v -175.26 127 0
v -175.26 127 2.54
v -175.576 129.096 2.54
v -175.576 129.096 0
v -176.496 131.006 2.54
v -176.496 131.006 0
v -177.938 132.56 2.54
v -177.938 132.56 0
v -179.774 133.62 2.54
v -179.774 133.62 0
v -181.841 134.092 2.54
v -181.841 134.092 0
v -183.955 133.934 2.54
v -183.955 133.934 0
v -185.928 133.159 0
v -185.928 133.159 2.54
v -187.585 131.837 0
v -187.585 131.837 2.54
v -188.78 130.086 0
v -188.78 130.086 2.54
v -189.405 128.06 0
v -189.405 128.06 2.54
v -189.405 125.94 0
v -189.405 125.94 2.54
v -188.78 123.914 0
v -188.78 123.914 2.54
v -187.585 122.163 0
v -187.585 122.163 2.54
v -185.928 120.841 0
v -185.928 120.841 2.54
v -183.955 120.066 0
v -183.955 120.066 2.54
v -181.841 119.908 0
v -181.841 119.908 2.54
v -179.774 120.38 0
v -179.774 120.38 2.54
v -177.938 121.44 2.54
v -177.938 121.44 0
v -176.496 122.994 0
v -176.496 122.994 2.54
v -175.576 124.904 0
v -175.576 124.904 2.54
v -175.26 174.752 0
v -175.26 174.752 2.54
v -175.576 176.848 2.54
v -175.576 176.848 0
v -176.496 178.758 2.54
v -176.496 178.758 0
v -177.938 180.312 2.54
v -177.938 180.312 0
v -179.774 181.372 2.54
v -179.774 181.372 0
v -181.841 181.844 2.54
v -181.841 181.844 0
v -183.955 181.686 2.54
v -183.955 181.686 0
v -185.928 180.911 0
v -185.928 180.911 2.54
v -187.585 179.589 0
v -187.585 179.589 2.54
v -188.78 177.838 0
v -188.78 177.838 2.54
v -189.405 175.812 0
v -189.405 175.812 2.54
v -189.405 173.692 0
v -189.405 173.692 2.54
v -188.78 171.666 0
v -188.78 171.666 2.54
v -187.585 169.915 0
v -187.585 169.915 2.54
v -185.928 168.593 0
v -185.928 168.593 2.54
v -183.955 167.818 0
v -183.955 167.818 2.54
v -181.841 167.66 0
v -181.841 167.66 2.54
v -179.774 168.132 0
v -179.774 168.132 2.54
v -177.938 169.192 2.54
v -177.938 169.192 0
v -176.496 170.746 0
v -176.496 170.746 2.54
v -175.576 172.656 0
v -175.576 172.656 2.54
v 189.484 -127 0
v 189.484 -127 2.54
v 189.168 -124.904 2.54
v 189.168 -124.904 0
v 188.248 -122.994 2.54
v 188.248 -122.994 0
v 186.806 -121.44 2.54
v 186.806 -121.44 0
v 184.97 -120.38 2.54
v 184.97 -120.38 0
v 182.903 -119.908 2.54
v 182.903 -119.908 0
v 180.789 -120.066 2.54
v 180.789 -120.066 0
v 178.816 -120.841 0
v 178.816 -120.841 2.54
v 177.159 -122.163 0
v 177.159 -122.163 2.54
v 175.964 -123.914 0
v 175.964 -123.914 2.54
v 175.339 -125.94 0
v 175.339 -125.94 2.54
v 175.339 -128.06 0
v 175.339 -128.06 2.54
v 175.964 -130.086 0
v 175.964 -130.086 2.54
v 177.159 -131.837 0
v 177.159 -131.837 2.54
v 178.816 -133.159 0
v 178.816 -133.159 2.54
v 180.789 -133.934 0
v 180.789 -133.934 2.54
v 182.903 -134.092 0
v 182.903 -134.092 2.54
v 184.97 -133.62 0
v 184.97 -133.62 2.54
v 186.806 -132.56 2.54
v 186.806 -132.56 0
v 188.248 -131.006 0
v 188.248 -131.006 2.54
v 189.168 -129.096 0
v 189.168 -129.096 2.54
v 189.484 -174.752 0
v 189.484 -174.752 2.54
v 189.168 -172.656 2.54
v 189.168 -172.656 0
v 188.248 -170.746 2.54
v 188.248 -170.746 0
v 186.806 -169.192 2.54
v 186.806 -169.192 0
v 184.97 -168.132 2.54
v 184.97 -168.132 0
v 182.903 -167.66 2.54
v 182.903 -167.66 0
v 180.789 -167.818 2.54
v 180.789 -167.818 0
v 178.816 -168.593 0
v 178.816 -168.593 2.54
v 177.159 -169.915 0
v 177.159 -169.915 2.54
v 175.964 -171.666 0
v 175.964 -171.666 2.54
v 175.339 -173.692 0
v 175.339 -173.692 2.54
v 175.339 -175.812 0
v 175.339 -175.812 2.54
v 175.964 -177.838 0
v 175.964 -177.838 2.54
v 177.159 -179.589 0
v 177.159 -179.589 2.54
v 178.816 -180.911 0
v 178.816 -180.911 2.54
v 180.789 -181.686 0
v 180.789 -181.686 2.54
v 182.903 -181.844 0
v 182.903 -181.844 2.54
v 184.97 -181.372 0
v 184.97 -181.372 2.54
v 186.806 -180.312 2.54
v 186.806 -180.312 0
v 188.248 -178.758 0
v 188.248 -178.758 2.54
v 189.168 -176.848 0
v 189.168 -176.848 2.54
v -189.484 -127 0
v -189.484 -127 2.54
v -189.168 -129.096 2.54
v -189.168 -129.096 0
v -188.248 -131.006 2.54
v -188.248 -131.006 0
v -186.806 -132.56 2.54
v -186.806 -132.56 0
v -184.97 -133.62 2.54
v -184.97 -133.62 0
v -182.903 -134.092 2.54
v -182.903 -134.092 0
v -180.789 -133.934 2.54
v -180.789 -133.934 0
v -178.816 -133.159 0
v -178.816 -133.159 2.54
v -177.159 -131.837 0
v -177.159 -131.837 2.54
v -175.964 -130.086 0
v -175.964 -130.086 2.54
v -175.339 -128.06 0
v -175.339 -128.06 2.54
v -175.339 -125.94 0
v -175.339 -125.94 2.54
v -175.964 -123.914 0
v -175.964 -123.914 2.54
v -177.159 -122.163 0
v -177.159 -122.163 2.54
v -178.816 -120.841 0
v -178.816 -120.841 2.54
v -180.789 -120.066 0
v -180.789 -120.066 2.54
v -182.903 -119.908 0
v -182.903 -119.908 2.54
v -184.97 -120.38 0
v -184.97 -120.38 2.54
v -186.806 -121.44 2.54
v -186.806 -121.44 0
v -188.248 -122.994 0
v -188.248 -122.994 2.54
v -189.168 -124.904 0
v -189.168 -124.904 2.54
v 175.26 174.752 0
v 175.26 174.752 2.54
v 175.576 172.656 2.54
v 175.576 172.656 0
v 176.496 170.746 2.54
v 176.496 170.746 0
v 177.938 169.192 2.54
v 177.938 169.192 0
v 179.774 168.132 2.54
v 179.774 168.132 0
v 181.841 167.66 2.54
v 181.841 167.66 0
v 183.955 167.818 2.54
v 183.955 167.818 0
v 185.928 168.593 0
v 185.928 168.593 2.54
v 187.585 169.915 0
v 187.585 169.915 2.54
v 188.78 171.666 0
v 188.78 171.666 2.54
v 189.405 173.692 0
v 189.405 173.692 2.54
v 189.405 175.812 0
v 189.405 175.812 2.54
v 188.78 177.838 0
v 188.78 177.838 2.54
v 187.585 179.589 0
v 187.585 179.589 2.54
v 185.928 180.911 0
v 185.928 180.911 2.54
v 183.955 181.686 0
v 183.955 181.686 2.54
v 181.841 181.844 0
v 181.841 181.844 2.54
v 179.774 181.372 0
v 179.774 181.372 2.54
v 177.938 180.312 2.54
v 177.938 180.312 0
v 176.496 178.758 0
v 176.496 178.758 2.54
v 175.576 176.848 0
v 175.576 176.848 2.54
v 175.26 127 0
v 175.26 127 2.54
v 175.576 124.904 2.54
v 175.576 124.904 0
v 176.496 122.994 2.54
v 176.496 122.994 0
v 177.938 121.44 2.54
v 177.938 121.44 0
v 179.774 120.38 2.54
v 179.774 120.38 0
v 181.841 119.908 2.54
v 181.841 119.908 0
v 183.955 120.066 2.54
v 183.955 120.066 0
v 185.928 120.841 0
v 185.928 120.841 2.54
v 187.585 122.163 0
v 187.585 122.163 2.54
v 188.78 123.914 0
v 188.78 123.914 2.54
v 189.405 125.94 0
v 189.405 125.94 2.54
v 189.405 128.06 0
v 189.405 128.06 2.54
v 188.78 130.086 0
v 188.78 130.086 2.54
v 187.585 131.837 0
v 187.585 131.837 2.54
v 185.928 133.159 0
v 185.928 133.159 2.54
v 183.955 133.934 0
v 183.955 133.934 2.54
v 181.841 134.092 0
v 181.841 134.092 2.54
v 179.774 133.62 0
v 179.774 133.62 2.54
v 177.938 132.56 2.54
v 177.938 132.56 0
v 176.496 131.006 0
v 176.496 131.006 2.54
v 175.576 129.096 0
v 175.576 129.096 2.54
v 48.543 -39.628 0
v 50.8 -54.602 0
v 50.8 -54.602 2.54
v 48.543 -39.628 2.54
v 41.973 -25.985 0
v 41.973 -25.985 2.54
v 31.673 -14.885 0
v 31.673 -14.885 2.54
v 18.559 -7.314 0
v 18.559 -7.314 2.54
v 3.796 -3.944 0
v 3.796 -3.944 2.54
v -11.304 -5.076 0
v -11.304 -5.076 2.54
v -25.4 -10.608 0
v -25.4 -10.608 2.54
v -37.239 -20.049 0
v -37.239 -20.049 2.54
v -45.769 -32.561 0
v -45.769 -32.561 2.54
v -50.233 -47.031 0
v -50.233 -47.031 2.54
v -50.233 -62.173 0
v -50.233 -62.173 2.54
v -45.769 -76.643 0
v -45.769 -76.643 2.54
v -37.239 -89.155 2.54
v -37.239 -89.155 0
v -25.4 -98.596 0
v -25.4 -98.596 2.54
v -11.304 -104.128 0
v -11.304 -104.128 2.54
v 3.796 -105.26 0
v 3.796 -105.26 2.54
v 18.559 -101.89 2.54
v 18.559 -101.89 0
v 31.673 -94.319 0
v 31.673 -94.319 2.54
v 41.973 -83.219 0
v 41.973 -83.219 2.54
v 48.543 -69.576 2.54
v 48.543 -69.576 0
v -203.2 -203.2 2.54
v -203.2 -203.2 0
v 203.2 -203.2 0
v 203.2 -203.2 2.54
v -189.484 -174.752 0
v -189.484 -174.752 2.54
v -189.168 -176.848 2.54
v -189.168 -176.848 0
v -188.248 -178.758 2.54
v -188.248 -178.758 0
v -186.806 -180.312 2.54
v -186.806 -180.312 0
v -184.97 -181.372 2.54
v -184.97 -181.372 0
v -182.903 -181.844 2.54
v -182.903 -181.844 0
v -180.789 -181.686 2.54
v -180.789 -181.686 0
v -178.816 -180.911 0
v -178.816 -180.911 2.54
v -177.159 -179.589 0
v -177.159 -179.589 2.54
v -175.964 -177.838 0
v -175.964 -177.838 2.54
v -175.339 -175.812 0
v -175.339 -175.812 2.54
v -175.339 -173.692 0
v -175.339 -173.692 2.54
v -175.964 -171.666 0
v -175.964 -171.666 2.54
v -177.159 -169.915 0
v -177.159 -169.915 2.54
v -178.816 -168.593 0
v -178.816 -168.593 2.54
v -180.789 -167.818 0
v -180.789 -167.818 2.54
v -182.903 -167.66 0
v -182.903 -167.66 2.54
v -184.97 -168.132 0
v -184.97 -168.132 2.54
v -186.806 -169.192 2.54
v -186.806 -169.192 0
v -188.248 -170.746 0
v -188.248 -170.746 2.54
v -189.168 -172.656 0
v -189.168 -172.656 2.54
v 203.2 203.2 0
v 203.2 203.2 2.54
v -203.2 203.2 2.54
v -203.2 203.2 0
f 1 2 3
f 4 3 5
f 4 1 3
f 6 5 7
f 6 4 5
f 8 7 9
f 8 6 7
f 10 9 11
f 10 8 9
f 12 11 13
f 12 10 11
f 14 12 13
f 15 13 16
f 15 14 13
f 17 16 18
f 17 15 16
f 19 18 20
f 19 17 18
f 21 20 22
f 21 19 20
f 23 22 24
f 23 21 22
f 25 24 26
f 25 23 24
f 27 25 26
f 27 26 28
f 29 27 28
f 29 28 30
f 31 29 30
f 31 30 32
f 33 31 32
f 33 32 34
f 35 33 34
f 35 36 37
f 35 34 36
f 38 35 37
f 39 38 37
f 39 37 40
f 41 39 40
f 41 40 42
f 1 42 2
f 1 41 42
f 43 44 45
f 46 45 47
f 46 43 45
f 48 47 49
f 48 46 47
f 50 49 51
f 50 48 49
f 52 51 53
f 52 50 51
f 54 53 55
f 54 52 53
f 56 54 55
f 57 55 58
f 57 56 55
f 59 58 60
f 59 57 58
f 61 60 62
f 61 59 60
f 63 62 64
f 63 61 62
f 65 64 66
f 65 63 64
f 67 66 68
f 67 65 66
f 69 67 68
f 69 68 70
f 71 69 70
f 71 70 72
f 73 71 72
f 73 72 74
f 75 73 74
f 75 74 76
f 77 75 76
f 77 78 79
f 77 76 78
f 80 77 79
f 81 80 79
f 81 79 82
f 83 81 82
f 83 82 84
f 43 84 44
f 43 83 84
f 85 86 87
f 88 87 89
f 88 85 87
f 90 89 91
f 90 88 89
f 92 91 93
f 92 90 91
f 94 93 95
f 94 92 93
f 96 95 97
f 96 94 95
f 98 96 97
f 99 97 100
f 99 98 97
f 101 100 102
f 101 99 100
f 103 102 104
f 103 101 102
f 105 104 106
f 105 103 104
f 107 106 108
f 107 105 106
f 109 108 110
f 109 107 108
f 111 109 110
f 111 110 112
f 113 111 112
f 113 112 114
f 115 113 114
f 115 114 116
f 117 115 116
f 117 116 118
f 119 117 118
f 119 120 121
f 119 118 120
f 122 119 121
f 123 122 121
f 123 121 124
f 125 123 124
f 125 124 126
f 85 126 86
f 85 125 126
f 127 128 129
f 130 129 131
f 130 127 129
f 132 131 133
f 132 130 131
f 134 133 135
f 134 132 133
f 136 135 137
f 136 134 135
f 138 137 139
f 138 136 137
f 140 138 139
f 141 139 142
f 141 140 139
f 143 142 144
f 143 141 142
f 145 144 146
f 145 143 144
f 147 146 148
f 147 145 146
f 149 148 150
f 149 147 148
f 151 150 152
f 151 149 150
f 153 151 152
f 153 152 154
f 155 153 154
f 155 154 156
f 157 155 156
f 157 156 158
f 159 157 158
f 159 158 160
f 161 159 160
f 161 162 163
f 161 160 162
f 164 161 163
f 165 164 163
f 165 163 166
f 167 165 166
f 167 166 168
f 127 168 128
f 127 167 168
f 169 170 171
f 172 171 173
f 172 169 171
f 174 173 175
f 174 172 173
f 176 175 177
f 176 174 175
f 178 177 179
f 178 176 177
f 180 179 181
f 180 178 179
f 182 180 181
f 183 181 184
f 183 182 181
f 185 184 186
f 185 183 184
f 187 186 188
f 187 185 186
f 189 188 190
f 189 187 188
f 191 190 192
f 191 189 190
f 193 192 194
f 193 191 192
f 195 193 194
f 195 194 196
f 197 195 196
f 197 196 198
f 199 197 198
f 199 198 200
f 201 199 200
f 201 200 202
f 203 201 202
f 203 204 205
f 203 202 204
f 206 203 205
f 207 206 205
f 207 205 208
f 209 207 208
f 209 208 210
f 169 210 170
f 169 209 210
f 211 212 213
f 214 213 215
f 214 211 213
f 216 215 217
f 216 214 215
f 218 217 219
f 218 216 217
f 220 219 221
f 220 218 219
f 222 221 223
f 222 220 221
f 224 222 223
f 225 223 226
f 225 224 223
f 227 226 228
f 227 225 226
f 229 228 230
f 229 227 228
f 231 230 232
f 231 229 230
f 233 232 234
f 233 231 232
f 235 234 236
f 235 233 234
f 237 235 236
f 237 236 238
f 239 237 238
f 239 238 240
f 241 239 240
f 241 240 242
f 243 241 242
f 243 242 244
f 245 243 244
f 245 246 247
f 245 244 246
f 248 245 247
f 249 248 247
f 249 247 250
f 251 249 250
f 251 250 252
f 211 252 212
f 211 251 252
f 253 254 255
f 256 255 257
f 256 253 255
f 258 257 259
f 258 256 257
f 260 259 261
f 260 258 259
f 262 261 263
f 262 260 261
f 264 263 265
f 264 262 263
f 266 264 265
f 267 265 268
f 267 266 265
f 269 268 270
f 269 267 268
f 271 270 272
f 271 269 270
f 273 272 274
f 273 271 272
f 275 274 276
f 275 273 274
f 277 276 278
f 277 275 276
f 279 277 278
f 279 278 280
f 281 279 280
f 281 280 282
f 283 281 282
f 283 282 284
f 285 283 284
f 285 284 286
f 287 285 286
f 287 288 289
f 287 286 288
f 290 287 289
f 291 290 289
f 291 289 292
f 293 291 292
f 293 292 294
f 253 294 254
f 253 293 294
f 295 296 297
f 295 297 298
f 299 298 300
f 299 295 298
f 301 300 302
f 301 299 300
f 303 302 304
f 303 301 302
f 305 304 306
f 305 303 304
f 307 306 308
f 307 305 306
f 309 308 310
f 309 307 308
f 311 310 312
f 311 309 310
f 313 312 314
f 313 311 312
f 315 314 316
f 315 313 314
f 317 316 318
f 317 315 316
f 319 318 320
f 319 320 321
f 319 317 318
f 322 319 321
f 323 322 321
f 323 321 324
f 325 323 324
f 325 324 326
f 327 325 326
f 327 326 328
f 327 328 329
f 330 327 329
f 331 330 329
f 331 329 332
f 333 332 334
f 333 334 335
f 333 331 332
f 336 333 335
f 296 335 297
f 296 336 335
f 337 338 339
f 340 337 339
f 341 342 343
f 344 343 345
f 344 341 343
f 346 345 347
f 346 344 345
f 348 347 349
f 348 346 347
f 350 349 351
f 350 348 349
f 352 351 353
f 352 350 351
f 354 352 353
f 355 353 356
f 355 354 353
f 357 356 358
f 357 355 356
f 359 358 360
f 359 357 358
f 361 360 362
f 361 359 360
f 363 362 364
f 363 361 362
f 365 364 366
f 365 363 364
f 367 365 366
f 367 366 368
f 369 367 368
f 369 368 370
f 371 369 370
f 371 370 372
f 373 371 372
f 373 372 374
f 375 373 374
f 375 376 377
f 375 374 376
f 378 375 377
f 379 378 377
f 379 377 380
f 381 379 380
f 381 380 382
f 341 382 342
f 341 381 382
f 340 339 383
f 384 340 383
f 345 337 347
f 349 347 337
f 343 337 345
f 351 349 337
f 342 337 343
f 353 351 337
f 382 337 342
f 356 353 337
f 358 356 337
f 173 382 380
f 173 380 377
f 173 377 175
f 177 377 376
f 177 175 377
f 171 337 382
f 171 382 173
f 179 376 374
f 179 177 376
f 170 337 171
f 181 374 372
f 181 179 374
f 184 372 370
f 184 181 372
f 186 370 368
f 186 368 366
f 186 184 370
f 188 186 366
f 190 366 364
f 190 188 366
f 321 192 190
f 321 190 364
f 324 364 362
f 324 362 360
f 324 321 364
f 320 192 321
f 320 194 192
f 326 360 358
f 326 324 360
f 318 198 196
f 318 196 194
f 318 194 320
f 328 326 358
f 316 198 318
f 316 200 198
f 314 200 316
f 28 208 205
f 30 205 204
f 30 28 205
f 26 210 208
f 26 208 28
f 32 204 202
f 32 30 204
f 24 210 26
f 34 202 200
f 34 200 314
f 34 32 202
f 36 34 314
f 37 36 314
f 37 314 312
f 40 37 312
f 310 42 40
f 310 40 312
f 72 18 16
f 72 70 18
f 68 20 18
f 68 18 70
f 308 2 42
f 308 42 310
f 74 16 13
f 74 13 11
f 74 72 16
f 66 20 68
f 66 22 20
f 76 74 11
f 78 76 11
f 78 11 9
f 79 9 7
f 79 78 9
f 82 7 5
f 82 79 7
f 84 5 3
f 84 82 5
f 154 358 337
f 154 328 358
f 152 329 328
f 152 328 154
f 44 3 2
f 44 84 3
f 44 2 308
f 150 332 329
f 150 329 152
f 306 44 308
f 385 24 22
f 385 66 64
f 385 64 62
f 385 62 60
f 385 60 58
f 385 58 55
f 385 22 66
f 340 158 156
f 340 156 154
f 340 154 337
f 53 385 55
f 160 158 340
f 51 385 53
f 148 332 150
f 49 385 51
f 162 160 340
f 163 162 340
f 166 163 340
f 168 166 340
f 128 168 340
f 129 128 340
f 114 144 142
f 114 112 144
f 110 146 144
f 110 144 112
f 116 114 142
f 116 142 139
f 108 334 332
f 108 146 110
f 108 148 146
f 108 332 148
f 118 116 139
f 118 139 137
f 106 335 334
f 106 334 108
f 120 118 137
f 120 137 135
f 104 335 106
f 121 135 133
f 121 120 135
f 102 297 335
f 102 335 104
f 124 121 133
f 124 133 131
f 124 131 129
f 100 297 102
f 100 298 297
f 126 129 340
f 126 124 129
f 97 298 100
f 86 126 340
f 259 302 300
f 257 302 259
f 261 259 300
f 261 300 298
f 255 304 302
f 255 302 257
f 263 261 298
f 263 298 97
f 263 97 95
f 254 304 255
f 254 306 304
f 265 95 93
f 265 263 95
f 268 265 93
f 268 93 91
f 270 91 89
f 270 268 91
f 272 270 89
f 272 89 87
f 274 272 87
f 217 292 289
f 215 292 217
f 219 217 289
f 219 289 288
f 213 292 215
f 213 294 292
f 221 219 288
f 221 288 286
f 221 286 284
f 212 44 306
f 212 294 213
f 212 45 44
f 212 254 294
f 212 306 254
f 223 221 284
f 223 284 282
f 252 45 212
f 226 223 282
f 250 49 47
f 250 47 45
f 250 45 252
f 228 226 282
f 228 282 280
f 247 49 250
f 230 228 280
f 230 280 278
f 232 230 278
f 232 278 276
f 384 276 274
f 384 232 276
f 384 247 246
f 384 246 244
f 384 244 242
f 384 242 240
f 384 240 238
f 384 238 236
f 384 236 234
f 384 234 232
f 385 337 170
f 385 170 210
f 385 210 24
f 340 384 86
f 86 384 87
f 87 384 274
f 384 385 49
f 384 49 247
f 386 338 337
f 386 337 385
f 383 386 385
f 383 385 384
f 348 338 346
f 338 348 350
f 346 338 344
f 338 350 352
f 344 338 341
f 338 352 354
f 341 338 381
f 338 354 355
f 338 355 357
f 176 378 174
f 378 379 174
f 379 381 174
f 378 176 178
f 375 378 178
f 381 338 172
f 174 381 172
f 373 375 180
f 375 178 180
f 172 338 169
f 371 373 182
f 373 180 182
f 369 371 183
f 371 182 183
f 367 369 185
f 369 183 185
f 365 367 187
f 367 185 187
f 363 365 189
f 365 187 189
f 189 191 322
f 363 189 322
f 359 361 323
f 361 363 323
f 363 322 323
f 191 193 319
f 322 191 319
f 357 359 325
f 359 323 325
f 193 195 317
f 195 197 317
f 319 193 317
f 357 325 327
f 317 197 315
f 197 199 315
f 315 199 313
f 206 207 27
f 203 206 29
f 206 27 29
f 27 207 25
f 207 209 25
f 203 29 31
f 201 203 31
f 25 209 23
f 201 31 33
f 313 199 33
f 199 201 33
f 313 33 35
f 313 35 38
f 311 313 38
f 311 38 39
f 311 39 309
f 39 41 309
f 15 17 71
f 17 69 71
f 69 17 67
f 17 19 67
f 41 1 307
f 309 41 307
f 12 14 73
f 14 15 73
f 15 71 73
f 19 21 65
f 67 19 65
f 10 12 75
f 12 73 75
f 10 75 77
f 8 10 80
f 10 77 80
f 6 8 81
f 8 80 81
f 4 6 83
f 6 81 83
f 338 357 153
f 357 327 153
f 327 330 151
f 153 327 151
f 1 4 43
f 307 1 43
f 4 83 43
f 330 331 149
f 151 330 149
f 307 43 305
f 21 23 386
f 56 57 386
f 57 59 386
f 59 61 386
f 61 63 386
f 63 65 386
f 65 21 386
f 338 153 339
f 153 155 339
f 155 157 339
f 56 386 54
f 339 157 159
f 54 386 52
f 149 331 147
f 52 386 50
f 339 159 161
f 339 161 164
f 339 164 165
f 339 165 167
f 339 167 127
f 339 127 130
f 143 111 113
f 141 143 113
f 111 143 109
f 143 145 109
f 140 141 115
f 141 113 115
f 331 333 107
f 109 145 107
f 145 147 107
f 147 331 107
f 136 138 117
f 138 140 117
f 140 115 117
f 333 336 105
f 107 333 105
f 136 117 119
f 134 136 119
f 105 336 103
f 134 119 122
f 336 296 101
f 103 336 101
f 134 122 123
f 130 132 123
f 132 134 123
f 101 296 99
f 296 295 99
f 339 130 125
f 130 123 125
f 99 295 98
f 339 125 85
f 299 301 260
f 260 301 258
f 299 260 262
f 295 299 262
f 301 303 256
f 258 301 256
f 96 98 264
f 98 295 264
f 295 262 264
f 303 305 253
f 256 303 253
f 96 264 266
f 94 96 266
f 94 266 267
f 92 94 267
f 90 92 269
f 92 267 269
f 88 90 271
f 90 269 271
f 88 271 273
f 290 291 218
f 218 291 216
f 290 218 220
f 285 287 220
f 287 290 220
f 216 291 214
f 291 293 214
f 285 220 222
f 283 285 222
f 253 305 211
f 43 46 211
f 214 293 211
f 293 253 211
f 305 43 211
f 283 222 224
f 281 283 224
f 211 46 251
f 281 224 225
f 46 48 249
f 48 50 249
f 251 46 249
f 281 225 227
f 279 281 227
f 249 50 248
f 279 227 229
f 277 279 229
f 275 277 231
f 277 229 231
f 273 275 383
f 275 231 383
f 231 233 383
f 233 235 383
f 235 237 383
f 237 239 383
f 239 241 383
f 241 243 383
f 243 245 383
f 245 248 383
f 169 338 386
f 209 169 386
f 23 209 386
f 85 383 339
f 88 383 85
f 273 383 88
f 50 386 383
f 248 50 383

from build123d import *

# Parameters (mm, degrees)
SKETCH_2_W          = 406.4
SKETCH_2_H          = 406.4
SKETCH_2_R          = 50.8
EXTRUDE_1_DEPTH     = 2.54
SKETCH_4_R          = 7.112
CUT_EXTRUDE_4_DEPTH = 288.379420975


with BuildPart() as part:
    # 草图2 → 凸台-拉伸1 (new body)
    with BuildSketch(Plane.XY):
        Rectangle(SKETCH_2_W, SKETCH_2_H)
        with Locations((0, -54.602000016)):
            Circle(SKETCH_2_R, mode=Mode.SUBTRACT)
    extrude(amount=EXTRUDE_1_DEPTH)

    # 草图4 → 切除-拉伸4 (cut, through all)
    with BuildSketch(Plane.XY):
        with Locations((-182.372, 127)):
            Circle(SKETCH_4_R)
        with Locations((-182.372, 174.752)):
            Circle(SKETCH_4_R)
        with Locations(Location((-182.372, -174.752, 0), (0, 0, 180))):
            Circle(SKETCH_4_R)
        with Locations(Location((-182.372, -127, 0), (0, 0, 180))):
            Circle(SKETCH_4_R)
        with Locations((182.372, -127)):
            Circle(SKETCH_4_R)
        with Locations((182.372, -174.752)):
            Circle(SKETCH_4_R)
        with Locations(Location((182.372, 174.752, 0), (0, 0, 180))):
            Circle(SKETCH_4_R)
        with Locations(Location((182.372, 127, 0), (0, 0, 180))):
            Circle(SKETCH_4_R)
    extrude(amount=CUT_EXTRUDE_4_DEPTH, mode=Mode.SUBTRACT)


solid = part.part
